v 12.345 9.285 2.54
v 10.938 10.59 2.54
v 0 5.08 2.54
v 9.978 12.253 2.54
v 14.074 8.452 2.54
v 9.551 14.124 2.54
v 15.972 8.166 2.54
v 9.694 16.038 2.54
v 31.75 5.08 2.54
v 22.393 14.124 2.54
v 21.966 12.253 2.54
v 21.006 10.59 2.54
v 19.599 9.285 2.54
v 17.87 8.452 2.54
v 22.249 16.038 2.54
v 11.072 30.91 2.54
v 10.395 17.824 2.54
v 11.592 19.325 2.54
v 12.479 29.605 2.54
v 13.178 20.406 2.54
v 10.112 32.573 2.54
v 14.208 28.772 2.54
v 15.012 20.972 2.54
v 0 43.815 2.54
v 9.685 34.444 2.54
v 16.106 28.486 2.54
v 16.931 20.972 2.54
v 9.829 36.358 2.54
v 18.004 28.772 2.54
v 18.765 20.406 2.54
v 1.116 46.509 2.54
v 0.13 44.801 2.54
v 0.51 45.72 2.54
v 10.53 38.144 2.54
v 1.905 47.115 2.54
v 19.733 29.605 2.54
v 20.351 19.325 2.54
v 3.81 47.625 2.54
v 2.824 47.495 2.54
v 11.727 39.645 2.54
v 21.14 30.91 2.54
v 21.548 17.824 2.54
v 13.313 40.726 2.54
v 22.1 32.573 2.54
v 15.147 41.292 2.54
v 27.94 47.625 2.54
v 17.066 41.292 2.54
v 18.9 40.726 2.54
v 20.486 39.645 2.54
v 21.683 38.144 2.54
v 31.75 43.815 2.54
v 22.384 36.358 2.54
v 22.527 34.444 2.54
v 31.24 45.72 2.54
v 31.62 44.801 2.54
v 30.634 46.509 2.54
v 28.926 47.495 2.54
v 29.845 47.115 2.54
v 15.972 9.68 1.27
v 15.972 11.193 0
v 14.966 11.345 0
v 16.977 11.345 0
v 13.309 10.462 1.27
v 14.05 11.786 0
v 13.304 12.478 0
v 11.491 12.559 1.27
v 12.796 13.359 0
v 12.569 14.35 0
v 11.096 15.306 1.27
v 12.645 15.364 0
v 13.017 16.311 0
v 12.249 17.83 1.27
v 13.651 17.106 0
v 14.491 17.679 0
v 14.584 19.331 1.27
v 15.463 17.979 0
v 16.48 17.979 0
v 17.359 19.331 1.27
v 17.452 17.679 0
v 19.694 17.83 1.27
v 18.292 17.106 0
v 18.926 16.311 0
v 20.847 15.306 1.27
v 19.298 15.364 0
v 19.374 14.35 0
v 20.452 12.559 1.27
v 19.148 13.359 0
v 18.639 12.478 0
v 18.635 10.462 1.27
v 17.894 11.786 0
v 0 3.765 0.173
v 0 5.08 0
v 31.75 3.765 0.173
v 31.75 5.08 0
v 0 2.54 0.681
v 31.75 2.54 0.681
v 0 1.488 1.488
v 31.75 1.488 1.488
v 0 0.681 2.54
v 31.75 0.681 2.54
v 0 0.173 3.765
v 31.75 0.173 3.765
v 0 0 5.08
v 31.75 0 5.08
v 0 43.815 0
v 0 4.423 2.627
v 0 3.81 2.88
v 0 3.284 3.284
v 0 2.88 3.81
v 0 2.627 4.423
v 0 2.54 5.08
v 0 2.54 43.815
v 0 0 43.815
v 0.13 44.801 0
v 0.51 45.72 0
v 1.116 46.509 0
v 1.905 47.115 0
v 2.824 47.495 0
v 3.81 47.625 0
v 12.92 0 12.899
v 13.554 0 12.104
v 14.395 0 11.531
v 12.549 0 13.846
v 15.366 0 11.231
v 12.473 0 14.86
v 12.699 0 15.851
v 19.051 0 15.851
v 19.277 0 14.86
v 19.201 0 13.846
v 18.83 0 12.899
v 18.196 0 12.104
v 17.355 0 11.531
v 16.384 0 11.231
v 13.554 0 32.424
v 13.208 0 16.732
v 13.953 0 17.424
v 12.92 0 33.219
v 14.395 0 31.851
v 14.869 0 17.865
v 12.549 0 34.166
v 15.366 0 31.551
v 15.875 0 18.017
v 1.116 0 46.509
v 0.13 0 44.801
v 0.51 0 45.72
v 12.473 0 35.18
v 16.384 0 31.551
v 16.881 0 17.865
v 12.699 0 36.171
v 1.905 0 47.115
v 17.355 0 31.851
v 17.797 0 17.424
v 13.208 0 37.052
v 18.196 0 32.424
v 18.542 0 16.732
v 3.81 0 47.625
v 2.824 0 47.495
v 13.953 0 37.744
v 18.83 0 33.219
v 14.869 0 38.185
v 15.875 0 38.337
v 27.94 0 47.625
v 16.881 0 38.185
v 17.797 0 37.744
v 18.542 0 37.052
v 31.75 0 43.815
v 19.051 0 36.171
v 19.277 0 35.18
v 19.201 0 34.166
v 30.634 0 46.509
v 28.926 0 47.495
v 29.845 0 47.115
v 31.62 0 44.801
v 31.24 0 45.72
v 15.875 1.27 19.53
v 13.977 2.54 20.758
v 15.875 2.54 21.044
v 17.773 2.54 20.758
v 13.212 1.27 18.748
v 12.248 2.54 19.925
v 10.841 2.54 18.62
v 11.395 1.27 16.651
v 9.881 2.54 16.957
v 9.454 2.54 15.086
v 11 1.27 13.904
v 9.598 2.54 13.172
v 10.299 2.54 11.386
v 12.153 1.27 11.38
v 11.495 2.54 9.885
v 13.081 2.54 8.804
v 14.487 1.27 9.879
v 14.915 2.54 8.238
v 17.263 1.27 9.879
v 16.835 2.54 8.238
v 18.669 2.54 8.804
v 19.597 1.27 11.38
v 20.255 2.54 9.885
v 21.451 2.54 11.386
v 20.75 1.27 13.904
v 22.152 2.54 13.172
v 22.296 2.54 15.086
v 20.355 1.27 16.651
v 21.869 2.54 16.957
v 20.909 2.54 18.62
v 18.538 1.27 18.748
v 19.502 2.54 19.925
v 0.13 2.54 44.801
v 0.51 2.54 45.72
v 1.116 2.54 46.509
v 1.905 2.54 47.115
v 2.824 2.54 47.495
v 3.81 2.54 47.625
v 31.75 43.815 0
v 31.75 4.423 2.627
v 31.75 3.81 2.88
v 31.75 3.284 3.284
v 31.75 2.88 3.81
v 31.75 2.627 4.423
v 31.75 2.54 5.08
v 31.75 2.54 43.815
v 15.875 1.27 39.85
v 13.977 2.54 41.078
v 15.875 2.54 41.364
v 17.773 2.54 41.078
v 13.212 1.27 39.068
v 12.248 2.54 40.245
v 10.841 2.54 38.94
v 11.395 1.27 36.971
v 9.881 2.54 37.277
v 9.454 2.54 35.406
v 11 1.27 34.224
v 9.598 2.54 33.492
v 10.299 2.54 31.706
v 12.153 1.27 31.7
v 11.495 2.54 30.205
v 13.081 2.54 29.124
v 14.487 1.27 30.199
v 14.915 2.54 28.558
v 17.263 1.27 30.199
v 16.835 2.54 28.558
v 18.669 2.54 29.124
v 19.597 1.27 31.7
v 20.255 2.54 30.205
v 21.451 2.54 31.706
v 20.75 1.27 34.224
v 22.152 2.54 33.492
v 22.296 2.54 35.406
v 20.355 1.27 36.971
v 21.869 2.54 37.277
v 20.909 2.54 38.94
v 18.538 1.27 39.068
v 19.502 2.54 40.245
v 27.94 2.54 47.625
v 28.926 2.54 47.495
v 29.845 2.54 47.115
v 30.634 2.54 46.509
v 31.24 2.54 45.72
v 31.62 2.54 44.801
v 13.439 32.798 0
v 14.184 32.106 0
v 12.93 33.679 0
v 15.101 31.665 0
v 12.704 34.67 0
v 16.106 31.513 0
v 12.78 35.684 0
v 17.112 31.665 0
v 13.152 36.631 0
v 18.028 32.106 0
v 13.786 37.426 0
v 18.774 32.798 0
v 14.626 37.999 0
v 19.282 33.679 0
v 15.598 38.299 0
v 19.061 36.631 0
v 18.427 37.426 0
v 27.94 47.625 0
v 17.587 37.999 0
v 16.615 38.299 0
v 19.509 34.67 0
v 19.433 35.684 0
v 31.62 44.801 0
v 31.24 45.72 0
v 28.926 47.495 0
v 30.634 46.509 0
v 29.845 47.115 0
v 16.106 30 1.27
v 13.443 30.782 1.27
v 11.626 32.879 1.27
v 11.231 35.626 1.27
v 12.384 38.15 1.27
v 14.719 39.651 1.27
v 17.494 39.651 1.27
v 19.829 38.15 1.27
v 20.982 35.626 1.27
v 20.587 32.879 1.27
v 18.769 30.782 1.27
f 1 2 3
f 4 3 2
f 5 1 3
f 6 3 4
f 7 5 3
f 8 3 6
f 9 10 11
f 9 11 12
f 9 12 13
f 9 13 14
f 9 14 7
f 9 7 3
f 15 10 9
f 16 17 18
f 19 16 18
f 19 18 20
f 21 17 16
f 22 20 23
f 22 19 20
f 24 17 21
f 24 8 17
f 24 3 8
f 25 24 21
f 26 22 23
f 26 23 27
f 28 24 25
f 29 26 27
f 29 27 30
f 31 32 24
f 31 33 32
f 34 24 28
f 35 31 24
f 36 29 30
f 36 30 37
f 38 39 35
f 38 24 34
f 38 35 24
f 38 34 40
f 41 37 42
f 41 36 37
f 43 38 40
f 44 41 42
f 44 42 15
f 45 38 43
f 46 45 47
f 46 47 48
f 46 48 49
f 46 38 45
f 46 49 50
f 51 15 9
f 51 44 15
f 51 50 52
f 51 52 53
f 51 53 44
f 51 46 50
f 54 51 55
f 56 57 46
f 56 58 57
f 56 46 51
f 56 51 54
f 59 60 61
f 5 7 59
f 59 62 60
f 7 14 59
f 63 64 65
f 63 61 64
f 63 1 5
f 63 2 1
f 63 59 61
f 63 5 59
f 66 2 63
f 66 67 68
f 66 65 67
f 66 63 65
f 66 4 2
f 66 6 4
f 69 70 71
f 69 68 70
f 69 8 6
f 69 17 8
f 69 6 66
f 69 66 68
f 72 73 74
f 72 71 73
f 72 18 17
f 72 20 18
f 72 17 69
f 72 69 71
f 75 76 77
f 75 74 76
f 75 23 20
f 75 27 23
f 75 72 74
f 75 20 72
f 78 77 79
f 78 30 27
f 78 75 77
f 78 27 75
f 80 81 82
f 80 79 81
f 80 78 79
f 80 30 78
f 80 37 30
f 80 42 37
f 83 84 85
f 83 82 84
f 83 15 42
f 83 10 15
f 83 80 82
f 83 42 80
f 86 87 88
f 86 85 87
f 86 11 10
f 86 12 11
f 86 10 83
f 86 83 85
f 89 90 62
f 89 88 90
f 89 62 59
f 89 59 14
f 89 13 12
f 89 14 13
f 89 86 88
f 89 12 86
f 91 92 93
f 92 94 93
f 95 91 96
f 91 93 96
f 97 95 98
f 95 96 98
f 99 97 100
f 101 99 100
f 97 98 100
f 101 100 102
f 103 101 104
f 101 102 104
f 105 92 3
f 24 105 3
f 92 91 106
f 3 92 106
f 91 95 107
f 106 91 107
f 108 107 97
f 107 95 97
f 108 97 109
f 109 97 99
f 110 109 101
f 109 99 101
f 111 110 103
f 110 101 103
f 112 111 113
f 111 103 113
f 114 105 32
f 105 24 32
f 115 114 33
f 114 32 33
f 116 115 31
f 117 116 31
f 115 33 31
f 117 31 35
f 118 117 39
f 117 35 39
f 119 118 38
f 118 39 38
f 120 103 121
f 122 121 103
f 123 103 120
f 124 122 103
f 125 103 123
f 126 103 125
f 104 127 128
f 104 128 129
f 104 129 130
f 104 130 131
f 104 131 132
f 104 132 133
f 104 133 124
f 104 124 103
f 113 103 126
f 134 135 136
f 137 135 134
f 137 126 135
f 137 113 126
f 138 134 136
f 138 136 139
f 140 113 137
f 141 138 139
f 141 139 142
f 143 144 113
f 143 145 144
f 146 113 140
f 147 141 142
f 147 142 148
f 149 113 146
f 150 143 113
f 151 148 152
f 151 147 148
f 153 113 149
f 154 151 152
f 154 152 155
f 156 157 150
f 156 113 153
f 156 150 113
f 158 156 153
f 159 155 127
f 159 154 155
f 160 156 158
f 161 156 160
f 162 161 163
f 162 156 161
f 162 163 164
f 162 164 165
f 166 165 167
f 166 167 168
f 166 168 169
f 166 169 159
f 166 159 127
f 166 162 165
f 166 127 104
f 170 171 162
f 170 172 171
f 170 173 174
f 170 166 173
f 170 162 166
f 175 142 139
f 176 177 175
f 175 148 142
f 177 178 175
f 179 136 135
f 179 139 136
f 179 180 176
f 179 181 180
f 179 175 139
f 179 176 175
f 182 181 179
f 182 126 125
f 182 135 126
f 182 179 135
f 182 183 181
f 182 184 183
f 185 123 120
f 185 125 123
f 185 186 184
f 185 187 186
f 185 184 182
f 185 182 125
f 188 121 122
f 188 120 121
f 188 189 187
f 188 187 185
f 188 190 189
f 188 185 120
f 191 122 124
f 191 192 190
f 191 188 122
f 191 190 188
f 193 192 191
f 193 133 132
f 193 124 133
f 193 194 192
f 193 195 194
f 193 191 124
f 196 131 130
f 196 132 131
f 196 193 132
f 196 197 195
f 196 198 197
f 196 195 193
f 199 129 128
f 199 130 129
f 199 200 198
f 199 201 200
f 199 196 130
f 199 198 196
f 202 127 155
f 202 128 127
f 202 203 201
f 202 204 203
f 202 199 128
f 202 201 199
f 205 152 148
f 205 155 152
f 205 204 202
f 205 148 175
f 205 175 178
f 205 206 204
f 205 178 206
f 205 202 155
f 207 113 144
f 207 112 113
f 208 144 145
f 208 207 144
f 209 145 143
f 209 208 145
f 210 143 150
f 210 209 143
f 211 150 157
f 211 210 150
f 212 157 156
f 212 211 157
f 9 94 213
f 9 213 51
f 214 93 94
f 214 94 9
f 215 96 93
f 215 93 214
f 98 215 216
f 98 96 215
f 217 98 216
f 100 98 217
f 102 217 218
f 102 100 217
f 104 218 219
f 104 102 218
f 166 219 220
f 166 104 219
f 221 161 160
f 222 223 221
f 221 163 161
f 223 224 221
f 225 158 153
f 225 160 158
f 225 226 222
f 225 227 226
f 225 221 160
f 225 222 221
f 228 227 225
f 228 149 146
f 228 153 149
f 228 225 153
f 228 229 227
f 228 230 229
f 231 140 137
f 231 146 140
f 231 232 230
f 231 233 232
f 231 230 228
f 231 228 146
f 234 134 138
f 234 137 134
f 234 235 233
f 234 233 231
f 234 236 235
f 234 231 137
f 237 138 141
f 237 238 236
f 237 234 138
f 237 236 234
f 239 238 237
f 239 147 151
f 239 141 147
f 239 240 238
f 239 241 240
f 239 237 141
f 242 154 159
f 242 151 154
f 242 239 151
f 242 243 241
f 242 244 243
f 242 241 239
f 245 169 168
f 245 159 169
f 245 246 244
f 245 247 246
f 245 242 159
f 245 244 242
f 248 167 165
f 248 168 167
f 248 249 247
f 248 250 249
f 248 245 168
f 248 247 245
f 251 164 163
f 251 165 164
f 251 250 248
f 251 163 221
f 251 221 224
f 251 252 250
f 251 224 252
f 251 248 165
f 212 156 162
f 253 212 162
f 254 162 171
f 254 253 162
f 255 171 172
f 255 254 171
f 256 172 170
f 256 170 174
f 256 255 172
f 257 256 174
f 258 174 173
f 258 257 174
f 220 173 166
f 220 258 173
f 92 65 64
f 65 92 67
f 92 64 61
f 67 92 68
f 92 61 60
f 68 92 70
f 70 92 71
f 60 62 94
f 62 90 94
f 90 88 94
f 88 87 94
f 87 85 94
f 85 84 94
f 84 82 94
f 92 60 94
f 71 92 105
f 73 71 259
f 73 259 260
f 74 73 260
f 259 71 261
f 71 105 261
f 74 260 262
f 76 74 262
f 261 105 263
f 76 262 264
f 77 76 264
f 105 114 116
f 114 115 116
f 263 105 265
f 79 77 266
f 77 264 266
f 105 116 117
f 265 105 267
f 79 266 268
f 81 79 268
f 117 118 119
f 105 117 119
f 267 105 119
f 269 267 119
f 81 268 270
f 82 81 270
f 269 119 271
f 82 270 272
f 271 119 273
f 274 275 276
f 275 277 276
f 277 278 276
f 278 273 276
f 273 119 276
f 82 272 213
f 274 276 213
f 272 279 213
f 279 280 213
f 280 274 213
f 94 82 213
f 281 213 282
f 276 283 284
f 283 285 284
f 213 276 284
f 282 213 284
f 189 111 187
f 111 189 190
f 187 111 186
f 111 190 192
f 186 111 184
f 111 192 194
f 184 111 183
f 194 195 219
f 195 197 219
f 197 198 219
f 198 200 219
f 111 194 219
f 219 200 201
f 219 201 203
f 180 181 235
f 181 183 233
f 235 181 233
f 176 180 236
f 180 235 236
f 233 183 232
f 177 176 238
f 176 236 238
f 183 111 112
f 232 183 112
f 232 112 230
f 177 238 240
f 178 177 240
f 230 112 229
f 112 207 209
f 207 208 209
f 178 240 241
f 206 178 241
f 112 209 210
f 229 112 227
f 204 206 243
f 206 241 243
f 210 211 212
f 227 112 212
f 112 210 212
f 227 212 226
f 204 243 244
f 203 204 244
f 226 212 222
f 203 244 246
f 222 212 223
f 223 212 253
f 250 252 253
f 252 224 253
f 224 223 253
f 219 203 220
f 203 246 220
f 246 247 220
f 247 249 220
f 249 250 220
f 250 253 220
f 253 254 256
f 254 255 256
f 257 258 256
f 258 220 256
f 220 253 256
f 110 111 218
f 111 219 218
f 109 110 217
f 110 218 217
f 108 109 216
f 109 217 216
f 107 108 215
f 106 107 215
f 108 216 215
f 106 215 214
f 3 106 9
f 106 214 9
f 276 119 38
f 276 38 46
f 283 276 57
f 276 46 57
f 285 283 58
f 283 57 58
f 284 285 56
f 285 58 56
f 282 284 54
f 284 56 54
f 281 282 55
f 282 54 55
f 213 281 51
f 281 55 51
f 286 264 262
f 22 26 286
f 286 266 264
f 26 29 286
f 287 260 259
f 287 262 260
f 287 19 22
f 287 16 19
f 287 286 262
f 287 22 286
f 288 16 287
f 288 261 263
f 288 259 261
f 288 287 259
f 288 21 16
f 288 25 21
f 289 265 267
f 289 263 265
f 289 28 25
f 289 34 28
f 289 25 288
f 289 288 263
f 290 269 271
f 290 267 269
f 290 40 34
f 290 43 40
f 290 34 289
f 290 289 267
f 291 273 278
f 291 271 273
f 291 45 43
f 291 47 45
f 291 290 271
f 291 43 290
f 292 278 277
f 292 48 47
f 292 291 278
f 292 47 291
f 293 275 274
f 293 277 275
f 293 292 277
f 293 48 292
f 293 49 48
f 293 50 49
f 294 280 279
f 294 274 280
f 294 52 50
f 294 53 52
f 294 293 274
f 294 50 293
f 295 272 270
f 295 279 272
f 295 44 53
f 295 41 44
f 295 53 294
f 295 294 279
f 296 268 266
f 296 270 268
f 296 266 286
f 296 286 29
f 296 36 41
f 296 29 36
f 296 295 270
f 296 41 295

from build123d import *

# Parameters (mm, degrees)
SKETCH1_W                                      = 31.75
SKETCH1_H                                      = 47.625
BOSS_EXTRUDE1_DEPTH                            = 2.54
SKETCH3_W                                      = 31.75
SKETCH3_H                                      = 45.085
BOSS_EXTRUDE2_DEPTH                            = 2.54
FILLET1_R                                      = 5.08
FILLET2_R                                      = 2.54
FILLET3_R                                      = 3.81
CSK_FOR_1_4_FLAT_HEAD_MACHINE_SCREW_2_COUNT    = 2
CSK_FOR_1_4_FLAT_HEAD_MACHINE_SCREW_2_PITCH    = 20.320445496
CSK_FOR_1_4_FLAT_HEAD_MACHINE_SCREW_3_AT_COUNT = 2
CSK_FOR_1_4_FLAT_HEAD_MACHINE_SCREW_3_AT_PITCH = 20.32


with BuildPart() as part:
    # Sketch1 → Boss-Extrude1 (new body)
    with BuildSketch(Plane.XY):
        with Locations((15.875, 23.8125)):
            Rectangle(SKETCH1_W, SKETCH1_H)
    extrude(amount=BOSS_EXTRUDE1_DEPTH)

    # Sketch3 → Boss-Extrude2 (add)
    with BuildSketch(Plane.XZ):
        with Locations((15.875, 25.0825)):
            Rectangle(SKETCH3_W, SKETCH3_H)
    extrude(amount=-BOSS_EXTRUDE2_DEPTH)

    # Fillet1
    fillet1_edges = [part.edges().sort_by_distance(p)[0] for p in [
        (15.875, 0, 0),
    ]]
    fillet(fillet1_edges, radius=FILLET1_R)

    # Fillet2
    fillet2_edges = [part.edges().sort_by_distance(p)[0] for p in [
        (15.875, 2.54, 2.54),
    ]]
    fillet(fillet2_edges, radius=FILLET2_R)

    # Fillet3
    fillet3_edges = [part.edges().sort_by_distance(p)[0] for p in [
        (0, 1.27, 47.625),
        (31.75, 1.27, 47.625),
        (0, 47.625, 1.27),
        (31.75, 47.625, 1.27),
    ]]
    fillet(fillet3_edges, radius=FILLET3_R)

    # Sketch5 → CSK for 1_4 Flat Head Machine Screw _100 (revolve, cut)
    with BuildSketch(Plane(origin=(16.106267099, 34.925, 2.54), x_dir=(0, -1, 0), z_dir=(1, 0, 0))):
        Polygon((0, 0), (0, 2.54), (3.3782, 2.54), (3.3782, 2.568232241), (6.4389, 0), align=None)
    csk_for_1_4_flat_head_machine_screw_100 = revolve(axis=Axis((16.106267099, 34.925, 8.89), (0, 0, -1)), mode=Mode.SUBTRACT)

    # CSK for 1_4 Flat Head Machine Screw  2: CSK for 1_4 Flat Head Machine Screw _100 ×2
    with Locations(*[Vector(-0.006621675847692915, -0.9999780764641634, 0) * (i * CSK_FOR_1_4_FLAT_HEAD_MACHINE_SCREW_2_PITCH) for i in range(1, CSK_FOR_1_4_FLAT_HEAD_MACHINE_SCREW_2_COUNT)]):
        add(csk_for_1_4_flat_head_machine_screw_100, mode=Mode.SUBTRACT)

    # Sketch7 → CSK for 1_4 Flat Head Machine Screw  3 (revolve, cut)
    with BuildSketch(Plane(origin=(15.875, 2.54, 34.925), x_dir=(0, 0, 1), z_dir=(1, 0, 0))):
        Polygon((0, 0), (0, 2.54), (3.3782, 2.54), (3.3782, 2.568232241), (6.4389, 0), align=None)
    csk_for_1_4_flat_head_machine_screw_3 = revolve(axis=Axis((15.875, 8.89, 34.925), (0, -1, 0)), mode=Mode.SUBTRACT)

    # CSK for 1_4 Flat Head Machine Screw 3 at: CSK for 1_4 Flat Head Machine Screw  3 ×2
    with Locations(*[(0, 0, -i * CSK_FOR_1_4_FLAT_HEAD_MACHINE_SCREW_3_AT_PITCH) for i in range(1, CSK_FOR_1_4_FLAT_HEAD_MACHINE_SCREW_3_AT_COUNT)]):
        add(csk_for_1_4_flat_head_machine_screw_3, mode=Mode.SUBTRACT)


solid = part.part
